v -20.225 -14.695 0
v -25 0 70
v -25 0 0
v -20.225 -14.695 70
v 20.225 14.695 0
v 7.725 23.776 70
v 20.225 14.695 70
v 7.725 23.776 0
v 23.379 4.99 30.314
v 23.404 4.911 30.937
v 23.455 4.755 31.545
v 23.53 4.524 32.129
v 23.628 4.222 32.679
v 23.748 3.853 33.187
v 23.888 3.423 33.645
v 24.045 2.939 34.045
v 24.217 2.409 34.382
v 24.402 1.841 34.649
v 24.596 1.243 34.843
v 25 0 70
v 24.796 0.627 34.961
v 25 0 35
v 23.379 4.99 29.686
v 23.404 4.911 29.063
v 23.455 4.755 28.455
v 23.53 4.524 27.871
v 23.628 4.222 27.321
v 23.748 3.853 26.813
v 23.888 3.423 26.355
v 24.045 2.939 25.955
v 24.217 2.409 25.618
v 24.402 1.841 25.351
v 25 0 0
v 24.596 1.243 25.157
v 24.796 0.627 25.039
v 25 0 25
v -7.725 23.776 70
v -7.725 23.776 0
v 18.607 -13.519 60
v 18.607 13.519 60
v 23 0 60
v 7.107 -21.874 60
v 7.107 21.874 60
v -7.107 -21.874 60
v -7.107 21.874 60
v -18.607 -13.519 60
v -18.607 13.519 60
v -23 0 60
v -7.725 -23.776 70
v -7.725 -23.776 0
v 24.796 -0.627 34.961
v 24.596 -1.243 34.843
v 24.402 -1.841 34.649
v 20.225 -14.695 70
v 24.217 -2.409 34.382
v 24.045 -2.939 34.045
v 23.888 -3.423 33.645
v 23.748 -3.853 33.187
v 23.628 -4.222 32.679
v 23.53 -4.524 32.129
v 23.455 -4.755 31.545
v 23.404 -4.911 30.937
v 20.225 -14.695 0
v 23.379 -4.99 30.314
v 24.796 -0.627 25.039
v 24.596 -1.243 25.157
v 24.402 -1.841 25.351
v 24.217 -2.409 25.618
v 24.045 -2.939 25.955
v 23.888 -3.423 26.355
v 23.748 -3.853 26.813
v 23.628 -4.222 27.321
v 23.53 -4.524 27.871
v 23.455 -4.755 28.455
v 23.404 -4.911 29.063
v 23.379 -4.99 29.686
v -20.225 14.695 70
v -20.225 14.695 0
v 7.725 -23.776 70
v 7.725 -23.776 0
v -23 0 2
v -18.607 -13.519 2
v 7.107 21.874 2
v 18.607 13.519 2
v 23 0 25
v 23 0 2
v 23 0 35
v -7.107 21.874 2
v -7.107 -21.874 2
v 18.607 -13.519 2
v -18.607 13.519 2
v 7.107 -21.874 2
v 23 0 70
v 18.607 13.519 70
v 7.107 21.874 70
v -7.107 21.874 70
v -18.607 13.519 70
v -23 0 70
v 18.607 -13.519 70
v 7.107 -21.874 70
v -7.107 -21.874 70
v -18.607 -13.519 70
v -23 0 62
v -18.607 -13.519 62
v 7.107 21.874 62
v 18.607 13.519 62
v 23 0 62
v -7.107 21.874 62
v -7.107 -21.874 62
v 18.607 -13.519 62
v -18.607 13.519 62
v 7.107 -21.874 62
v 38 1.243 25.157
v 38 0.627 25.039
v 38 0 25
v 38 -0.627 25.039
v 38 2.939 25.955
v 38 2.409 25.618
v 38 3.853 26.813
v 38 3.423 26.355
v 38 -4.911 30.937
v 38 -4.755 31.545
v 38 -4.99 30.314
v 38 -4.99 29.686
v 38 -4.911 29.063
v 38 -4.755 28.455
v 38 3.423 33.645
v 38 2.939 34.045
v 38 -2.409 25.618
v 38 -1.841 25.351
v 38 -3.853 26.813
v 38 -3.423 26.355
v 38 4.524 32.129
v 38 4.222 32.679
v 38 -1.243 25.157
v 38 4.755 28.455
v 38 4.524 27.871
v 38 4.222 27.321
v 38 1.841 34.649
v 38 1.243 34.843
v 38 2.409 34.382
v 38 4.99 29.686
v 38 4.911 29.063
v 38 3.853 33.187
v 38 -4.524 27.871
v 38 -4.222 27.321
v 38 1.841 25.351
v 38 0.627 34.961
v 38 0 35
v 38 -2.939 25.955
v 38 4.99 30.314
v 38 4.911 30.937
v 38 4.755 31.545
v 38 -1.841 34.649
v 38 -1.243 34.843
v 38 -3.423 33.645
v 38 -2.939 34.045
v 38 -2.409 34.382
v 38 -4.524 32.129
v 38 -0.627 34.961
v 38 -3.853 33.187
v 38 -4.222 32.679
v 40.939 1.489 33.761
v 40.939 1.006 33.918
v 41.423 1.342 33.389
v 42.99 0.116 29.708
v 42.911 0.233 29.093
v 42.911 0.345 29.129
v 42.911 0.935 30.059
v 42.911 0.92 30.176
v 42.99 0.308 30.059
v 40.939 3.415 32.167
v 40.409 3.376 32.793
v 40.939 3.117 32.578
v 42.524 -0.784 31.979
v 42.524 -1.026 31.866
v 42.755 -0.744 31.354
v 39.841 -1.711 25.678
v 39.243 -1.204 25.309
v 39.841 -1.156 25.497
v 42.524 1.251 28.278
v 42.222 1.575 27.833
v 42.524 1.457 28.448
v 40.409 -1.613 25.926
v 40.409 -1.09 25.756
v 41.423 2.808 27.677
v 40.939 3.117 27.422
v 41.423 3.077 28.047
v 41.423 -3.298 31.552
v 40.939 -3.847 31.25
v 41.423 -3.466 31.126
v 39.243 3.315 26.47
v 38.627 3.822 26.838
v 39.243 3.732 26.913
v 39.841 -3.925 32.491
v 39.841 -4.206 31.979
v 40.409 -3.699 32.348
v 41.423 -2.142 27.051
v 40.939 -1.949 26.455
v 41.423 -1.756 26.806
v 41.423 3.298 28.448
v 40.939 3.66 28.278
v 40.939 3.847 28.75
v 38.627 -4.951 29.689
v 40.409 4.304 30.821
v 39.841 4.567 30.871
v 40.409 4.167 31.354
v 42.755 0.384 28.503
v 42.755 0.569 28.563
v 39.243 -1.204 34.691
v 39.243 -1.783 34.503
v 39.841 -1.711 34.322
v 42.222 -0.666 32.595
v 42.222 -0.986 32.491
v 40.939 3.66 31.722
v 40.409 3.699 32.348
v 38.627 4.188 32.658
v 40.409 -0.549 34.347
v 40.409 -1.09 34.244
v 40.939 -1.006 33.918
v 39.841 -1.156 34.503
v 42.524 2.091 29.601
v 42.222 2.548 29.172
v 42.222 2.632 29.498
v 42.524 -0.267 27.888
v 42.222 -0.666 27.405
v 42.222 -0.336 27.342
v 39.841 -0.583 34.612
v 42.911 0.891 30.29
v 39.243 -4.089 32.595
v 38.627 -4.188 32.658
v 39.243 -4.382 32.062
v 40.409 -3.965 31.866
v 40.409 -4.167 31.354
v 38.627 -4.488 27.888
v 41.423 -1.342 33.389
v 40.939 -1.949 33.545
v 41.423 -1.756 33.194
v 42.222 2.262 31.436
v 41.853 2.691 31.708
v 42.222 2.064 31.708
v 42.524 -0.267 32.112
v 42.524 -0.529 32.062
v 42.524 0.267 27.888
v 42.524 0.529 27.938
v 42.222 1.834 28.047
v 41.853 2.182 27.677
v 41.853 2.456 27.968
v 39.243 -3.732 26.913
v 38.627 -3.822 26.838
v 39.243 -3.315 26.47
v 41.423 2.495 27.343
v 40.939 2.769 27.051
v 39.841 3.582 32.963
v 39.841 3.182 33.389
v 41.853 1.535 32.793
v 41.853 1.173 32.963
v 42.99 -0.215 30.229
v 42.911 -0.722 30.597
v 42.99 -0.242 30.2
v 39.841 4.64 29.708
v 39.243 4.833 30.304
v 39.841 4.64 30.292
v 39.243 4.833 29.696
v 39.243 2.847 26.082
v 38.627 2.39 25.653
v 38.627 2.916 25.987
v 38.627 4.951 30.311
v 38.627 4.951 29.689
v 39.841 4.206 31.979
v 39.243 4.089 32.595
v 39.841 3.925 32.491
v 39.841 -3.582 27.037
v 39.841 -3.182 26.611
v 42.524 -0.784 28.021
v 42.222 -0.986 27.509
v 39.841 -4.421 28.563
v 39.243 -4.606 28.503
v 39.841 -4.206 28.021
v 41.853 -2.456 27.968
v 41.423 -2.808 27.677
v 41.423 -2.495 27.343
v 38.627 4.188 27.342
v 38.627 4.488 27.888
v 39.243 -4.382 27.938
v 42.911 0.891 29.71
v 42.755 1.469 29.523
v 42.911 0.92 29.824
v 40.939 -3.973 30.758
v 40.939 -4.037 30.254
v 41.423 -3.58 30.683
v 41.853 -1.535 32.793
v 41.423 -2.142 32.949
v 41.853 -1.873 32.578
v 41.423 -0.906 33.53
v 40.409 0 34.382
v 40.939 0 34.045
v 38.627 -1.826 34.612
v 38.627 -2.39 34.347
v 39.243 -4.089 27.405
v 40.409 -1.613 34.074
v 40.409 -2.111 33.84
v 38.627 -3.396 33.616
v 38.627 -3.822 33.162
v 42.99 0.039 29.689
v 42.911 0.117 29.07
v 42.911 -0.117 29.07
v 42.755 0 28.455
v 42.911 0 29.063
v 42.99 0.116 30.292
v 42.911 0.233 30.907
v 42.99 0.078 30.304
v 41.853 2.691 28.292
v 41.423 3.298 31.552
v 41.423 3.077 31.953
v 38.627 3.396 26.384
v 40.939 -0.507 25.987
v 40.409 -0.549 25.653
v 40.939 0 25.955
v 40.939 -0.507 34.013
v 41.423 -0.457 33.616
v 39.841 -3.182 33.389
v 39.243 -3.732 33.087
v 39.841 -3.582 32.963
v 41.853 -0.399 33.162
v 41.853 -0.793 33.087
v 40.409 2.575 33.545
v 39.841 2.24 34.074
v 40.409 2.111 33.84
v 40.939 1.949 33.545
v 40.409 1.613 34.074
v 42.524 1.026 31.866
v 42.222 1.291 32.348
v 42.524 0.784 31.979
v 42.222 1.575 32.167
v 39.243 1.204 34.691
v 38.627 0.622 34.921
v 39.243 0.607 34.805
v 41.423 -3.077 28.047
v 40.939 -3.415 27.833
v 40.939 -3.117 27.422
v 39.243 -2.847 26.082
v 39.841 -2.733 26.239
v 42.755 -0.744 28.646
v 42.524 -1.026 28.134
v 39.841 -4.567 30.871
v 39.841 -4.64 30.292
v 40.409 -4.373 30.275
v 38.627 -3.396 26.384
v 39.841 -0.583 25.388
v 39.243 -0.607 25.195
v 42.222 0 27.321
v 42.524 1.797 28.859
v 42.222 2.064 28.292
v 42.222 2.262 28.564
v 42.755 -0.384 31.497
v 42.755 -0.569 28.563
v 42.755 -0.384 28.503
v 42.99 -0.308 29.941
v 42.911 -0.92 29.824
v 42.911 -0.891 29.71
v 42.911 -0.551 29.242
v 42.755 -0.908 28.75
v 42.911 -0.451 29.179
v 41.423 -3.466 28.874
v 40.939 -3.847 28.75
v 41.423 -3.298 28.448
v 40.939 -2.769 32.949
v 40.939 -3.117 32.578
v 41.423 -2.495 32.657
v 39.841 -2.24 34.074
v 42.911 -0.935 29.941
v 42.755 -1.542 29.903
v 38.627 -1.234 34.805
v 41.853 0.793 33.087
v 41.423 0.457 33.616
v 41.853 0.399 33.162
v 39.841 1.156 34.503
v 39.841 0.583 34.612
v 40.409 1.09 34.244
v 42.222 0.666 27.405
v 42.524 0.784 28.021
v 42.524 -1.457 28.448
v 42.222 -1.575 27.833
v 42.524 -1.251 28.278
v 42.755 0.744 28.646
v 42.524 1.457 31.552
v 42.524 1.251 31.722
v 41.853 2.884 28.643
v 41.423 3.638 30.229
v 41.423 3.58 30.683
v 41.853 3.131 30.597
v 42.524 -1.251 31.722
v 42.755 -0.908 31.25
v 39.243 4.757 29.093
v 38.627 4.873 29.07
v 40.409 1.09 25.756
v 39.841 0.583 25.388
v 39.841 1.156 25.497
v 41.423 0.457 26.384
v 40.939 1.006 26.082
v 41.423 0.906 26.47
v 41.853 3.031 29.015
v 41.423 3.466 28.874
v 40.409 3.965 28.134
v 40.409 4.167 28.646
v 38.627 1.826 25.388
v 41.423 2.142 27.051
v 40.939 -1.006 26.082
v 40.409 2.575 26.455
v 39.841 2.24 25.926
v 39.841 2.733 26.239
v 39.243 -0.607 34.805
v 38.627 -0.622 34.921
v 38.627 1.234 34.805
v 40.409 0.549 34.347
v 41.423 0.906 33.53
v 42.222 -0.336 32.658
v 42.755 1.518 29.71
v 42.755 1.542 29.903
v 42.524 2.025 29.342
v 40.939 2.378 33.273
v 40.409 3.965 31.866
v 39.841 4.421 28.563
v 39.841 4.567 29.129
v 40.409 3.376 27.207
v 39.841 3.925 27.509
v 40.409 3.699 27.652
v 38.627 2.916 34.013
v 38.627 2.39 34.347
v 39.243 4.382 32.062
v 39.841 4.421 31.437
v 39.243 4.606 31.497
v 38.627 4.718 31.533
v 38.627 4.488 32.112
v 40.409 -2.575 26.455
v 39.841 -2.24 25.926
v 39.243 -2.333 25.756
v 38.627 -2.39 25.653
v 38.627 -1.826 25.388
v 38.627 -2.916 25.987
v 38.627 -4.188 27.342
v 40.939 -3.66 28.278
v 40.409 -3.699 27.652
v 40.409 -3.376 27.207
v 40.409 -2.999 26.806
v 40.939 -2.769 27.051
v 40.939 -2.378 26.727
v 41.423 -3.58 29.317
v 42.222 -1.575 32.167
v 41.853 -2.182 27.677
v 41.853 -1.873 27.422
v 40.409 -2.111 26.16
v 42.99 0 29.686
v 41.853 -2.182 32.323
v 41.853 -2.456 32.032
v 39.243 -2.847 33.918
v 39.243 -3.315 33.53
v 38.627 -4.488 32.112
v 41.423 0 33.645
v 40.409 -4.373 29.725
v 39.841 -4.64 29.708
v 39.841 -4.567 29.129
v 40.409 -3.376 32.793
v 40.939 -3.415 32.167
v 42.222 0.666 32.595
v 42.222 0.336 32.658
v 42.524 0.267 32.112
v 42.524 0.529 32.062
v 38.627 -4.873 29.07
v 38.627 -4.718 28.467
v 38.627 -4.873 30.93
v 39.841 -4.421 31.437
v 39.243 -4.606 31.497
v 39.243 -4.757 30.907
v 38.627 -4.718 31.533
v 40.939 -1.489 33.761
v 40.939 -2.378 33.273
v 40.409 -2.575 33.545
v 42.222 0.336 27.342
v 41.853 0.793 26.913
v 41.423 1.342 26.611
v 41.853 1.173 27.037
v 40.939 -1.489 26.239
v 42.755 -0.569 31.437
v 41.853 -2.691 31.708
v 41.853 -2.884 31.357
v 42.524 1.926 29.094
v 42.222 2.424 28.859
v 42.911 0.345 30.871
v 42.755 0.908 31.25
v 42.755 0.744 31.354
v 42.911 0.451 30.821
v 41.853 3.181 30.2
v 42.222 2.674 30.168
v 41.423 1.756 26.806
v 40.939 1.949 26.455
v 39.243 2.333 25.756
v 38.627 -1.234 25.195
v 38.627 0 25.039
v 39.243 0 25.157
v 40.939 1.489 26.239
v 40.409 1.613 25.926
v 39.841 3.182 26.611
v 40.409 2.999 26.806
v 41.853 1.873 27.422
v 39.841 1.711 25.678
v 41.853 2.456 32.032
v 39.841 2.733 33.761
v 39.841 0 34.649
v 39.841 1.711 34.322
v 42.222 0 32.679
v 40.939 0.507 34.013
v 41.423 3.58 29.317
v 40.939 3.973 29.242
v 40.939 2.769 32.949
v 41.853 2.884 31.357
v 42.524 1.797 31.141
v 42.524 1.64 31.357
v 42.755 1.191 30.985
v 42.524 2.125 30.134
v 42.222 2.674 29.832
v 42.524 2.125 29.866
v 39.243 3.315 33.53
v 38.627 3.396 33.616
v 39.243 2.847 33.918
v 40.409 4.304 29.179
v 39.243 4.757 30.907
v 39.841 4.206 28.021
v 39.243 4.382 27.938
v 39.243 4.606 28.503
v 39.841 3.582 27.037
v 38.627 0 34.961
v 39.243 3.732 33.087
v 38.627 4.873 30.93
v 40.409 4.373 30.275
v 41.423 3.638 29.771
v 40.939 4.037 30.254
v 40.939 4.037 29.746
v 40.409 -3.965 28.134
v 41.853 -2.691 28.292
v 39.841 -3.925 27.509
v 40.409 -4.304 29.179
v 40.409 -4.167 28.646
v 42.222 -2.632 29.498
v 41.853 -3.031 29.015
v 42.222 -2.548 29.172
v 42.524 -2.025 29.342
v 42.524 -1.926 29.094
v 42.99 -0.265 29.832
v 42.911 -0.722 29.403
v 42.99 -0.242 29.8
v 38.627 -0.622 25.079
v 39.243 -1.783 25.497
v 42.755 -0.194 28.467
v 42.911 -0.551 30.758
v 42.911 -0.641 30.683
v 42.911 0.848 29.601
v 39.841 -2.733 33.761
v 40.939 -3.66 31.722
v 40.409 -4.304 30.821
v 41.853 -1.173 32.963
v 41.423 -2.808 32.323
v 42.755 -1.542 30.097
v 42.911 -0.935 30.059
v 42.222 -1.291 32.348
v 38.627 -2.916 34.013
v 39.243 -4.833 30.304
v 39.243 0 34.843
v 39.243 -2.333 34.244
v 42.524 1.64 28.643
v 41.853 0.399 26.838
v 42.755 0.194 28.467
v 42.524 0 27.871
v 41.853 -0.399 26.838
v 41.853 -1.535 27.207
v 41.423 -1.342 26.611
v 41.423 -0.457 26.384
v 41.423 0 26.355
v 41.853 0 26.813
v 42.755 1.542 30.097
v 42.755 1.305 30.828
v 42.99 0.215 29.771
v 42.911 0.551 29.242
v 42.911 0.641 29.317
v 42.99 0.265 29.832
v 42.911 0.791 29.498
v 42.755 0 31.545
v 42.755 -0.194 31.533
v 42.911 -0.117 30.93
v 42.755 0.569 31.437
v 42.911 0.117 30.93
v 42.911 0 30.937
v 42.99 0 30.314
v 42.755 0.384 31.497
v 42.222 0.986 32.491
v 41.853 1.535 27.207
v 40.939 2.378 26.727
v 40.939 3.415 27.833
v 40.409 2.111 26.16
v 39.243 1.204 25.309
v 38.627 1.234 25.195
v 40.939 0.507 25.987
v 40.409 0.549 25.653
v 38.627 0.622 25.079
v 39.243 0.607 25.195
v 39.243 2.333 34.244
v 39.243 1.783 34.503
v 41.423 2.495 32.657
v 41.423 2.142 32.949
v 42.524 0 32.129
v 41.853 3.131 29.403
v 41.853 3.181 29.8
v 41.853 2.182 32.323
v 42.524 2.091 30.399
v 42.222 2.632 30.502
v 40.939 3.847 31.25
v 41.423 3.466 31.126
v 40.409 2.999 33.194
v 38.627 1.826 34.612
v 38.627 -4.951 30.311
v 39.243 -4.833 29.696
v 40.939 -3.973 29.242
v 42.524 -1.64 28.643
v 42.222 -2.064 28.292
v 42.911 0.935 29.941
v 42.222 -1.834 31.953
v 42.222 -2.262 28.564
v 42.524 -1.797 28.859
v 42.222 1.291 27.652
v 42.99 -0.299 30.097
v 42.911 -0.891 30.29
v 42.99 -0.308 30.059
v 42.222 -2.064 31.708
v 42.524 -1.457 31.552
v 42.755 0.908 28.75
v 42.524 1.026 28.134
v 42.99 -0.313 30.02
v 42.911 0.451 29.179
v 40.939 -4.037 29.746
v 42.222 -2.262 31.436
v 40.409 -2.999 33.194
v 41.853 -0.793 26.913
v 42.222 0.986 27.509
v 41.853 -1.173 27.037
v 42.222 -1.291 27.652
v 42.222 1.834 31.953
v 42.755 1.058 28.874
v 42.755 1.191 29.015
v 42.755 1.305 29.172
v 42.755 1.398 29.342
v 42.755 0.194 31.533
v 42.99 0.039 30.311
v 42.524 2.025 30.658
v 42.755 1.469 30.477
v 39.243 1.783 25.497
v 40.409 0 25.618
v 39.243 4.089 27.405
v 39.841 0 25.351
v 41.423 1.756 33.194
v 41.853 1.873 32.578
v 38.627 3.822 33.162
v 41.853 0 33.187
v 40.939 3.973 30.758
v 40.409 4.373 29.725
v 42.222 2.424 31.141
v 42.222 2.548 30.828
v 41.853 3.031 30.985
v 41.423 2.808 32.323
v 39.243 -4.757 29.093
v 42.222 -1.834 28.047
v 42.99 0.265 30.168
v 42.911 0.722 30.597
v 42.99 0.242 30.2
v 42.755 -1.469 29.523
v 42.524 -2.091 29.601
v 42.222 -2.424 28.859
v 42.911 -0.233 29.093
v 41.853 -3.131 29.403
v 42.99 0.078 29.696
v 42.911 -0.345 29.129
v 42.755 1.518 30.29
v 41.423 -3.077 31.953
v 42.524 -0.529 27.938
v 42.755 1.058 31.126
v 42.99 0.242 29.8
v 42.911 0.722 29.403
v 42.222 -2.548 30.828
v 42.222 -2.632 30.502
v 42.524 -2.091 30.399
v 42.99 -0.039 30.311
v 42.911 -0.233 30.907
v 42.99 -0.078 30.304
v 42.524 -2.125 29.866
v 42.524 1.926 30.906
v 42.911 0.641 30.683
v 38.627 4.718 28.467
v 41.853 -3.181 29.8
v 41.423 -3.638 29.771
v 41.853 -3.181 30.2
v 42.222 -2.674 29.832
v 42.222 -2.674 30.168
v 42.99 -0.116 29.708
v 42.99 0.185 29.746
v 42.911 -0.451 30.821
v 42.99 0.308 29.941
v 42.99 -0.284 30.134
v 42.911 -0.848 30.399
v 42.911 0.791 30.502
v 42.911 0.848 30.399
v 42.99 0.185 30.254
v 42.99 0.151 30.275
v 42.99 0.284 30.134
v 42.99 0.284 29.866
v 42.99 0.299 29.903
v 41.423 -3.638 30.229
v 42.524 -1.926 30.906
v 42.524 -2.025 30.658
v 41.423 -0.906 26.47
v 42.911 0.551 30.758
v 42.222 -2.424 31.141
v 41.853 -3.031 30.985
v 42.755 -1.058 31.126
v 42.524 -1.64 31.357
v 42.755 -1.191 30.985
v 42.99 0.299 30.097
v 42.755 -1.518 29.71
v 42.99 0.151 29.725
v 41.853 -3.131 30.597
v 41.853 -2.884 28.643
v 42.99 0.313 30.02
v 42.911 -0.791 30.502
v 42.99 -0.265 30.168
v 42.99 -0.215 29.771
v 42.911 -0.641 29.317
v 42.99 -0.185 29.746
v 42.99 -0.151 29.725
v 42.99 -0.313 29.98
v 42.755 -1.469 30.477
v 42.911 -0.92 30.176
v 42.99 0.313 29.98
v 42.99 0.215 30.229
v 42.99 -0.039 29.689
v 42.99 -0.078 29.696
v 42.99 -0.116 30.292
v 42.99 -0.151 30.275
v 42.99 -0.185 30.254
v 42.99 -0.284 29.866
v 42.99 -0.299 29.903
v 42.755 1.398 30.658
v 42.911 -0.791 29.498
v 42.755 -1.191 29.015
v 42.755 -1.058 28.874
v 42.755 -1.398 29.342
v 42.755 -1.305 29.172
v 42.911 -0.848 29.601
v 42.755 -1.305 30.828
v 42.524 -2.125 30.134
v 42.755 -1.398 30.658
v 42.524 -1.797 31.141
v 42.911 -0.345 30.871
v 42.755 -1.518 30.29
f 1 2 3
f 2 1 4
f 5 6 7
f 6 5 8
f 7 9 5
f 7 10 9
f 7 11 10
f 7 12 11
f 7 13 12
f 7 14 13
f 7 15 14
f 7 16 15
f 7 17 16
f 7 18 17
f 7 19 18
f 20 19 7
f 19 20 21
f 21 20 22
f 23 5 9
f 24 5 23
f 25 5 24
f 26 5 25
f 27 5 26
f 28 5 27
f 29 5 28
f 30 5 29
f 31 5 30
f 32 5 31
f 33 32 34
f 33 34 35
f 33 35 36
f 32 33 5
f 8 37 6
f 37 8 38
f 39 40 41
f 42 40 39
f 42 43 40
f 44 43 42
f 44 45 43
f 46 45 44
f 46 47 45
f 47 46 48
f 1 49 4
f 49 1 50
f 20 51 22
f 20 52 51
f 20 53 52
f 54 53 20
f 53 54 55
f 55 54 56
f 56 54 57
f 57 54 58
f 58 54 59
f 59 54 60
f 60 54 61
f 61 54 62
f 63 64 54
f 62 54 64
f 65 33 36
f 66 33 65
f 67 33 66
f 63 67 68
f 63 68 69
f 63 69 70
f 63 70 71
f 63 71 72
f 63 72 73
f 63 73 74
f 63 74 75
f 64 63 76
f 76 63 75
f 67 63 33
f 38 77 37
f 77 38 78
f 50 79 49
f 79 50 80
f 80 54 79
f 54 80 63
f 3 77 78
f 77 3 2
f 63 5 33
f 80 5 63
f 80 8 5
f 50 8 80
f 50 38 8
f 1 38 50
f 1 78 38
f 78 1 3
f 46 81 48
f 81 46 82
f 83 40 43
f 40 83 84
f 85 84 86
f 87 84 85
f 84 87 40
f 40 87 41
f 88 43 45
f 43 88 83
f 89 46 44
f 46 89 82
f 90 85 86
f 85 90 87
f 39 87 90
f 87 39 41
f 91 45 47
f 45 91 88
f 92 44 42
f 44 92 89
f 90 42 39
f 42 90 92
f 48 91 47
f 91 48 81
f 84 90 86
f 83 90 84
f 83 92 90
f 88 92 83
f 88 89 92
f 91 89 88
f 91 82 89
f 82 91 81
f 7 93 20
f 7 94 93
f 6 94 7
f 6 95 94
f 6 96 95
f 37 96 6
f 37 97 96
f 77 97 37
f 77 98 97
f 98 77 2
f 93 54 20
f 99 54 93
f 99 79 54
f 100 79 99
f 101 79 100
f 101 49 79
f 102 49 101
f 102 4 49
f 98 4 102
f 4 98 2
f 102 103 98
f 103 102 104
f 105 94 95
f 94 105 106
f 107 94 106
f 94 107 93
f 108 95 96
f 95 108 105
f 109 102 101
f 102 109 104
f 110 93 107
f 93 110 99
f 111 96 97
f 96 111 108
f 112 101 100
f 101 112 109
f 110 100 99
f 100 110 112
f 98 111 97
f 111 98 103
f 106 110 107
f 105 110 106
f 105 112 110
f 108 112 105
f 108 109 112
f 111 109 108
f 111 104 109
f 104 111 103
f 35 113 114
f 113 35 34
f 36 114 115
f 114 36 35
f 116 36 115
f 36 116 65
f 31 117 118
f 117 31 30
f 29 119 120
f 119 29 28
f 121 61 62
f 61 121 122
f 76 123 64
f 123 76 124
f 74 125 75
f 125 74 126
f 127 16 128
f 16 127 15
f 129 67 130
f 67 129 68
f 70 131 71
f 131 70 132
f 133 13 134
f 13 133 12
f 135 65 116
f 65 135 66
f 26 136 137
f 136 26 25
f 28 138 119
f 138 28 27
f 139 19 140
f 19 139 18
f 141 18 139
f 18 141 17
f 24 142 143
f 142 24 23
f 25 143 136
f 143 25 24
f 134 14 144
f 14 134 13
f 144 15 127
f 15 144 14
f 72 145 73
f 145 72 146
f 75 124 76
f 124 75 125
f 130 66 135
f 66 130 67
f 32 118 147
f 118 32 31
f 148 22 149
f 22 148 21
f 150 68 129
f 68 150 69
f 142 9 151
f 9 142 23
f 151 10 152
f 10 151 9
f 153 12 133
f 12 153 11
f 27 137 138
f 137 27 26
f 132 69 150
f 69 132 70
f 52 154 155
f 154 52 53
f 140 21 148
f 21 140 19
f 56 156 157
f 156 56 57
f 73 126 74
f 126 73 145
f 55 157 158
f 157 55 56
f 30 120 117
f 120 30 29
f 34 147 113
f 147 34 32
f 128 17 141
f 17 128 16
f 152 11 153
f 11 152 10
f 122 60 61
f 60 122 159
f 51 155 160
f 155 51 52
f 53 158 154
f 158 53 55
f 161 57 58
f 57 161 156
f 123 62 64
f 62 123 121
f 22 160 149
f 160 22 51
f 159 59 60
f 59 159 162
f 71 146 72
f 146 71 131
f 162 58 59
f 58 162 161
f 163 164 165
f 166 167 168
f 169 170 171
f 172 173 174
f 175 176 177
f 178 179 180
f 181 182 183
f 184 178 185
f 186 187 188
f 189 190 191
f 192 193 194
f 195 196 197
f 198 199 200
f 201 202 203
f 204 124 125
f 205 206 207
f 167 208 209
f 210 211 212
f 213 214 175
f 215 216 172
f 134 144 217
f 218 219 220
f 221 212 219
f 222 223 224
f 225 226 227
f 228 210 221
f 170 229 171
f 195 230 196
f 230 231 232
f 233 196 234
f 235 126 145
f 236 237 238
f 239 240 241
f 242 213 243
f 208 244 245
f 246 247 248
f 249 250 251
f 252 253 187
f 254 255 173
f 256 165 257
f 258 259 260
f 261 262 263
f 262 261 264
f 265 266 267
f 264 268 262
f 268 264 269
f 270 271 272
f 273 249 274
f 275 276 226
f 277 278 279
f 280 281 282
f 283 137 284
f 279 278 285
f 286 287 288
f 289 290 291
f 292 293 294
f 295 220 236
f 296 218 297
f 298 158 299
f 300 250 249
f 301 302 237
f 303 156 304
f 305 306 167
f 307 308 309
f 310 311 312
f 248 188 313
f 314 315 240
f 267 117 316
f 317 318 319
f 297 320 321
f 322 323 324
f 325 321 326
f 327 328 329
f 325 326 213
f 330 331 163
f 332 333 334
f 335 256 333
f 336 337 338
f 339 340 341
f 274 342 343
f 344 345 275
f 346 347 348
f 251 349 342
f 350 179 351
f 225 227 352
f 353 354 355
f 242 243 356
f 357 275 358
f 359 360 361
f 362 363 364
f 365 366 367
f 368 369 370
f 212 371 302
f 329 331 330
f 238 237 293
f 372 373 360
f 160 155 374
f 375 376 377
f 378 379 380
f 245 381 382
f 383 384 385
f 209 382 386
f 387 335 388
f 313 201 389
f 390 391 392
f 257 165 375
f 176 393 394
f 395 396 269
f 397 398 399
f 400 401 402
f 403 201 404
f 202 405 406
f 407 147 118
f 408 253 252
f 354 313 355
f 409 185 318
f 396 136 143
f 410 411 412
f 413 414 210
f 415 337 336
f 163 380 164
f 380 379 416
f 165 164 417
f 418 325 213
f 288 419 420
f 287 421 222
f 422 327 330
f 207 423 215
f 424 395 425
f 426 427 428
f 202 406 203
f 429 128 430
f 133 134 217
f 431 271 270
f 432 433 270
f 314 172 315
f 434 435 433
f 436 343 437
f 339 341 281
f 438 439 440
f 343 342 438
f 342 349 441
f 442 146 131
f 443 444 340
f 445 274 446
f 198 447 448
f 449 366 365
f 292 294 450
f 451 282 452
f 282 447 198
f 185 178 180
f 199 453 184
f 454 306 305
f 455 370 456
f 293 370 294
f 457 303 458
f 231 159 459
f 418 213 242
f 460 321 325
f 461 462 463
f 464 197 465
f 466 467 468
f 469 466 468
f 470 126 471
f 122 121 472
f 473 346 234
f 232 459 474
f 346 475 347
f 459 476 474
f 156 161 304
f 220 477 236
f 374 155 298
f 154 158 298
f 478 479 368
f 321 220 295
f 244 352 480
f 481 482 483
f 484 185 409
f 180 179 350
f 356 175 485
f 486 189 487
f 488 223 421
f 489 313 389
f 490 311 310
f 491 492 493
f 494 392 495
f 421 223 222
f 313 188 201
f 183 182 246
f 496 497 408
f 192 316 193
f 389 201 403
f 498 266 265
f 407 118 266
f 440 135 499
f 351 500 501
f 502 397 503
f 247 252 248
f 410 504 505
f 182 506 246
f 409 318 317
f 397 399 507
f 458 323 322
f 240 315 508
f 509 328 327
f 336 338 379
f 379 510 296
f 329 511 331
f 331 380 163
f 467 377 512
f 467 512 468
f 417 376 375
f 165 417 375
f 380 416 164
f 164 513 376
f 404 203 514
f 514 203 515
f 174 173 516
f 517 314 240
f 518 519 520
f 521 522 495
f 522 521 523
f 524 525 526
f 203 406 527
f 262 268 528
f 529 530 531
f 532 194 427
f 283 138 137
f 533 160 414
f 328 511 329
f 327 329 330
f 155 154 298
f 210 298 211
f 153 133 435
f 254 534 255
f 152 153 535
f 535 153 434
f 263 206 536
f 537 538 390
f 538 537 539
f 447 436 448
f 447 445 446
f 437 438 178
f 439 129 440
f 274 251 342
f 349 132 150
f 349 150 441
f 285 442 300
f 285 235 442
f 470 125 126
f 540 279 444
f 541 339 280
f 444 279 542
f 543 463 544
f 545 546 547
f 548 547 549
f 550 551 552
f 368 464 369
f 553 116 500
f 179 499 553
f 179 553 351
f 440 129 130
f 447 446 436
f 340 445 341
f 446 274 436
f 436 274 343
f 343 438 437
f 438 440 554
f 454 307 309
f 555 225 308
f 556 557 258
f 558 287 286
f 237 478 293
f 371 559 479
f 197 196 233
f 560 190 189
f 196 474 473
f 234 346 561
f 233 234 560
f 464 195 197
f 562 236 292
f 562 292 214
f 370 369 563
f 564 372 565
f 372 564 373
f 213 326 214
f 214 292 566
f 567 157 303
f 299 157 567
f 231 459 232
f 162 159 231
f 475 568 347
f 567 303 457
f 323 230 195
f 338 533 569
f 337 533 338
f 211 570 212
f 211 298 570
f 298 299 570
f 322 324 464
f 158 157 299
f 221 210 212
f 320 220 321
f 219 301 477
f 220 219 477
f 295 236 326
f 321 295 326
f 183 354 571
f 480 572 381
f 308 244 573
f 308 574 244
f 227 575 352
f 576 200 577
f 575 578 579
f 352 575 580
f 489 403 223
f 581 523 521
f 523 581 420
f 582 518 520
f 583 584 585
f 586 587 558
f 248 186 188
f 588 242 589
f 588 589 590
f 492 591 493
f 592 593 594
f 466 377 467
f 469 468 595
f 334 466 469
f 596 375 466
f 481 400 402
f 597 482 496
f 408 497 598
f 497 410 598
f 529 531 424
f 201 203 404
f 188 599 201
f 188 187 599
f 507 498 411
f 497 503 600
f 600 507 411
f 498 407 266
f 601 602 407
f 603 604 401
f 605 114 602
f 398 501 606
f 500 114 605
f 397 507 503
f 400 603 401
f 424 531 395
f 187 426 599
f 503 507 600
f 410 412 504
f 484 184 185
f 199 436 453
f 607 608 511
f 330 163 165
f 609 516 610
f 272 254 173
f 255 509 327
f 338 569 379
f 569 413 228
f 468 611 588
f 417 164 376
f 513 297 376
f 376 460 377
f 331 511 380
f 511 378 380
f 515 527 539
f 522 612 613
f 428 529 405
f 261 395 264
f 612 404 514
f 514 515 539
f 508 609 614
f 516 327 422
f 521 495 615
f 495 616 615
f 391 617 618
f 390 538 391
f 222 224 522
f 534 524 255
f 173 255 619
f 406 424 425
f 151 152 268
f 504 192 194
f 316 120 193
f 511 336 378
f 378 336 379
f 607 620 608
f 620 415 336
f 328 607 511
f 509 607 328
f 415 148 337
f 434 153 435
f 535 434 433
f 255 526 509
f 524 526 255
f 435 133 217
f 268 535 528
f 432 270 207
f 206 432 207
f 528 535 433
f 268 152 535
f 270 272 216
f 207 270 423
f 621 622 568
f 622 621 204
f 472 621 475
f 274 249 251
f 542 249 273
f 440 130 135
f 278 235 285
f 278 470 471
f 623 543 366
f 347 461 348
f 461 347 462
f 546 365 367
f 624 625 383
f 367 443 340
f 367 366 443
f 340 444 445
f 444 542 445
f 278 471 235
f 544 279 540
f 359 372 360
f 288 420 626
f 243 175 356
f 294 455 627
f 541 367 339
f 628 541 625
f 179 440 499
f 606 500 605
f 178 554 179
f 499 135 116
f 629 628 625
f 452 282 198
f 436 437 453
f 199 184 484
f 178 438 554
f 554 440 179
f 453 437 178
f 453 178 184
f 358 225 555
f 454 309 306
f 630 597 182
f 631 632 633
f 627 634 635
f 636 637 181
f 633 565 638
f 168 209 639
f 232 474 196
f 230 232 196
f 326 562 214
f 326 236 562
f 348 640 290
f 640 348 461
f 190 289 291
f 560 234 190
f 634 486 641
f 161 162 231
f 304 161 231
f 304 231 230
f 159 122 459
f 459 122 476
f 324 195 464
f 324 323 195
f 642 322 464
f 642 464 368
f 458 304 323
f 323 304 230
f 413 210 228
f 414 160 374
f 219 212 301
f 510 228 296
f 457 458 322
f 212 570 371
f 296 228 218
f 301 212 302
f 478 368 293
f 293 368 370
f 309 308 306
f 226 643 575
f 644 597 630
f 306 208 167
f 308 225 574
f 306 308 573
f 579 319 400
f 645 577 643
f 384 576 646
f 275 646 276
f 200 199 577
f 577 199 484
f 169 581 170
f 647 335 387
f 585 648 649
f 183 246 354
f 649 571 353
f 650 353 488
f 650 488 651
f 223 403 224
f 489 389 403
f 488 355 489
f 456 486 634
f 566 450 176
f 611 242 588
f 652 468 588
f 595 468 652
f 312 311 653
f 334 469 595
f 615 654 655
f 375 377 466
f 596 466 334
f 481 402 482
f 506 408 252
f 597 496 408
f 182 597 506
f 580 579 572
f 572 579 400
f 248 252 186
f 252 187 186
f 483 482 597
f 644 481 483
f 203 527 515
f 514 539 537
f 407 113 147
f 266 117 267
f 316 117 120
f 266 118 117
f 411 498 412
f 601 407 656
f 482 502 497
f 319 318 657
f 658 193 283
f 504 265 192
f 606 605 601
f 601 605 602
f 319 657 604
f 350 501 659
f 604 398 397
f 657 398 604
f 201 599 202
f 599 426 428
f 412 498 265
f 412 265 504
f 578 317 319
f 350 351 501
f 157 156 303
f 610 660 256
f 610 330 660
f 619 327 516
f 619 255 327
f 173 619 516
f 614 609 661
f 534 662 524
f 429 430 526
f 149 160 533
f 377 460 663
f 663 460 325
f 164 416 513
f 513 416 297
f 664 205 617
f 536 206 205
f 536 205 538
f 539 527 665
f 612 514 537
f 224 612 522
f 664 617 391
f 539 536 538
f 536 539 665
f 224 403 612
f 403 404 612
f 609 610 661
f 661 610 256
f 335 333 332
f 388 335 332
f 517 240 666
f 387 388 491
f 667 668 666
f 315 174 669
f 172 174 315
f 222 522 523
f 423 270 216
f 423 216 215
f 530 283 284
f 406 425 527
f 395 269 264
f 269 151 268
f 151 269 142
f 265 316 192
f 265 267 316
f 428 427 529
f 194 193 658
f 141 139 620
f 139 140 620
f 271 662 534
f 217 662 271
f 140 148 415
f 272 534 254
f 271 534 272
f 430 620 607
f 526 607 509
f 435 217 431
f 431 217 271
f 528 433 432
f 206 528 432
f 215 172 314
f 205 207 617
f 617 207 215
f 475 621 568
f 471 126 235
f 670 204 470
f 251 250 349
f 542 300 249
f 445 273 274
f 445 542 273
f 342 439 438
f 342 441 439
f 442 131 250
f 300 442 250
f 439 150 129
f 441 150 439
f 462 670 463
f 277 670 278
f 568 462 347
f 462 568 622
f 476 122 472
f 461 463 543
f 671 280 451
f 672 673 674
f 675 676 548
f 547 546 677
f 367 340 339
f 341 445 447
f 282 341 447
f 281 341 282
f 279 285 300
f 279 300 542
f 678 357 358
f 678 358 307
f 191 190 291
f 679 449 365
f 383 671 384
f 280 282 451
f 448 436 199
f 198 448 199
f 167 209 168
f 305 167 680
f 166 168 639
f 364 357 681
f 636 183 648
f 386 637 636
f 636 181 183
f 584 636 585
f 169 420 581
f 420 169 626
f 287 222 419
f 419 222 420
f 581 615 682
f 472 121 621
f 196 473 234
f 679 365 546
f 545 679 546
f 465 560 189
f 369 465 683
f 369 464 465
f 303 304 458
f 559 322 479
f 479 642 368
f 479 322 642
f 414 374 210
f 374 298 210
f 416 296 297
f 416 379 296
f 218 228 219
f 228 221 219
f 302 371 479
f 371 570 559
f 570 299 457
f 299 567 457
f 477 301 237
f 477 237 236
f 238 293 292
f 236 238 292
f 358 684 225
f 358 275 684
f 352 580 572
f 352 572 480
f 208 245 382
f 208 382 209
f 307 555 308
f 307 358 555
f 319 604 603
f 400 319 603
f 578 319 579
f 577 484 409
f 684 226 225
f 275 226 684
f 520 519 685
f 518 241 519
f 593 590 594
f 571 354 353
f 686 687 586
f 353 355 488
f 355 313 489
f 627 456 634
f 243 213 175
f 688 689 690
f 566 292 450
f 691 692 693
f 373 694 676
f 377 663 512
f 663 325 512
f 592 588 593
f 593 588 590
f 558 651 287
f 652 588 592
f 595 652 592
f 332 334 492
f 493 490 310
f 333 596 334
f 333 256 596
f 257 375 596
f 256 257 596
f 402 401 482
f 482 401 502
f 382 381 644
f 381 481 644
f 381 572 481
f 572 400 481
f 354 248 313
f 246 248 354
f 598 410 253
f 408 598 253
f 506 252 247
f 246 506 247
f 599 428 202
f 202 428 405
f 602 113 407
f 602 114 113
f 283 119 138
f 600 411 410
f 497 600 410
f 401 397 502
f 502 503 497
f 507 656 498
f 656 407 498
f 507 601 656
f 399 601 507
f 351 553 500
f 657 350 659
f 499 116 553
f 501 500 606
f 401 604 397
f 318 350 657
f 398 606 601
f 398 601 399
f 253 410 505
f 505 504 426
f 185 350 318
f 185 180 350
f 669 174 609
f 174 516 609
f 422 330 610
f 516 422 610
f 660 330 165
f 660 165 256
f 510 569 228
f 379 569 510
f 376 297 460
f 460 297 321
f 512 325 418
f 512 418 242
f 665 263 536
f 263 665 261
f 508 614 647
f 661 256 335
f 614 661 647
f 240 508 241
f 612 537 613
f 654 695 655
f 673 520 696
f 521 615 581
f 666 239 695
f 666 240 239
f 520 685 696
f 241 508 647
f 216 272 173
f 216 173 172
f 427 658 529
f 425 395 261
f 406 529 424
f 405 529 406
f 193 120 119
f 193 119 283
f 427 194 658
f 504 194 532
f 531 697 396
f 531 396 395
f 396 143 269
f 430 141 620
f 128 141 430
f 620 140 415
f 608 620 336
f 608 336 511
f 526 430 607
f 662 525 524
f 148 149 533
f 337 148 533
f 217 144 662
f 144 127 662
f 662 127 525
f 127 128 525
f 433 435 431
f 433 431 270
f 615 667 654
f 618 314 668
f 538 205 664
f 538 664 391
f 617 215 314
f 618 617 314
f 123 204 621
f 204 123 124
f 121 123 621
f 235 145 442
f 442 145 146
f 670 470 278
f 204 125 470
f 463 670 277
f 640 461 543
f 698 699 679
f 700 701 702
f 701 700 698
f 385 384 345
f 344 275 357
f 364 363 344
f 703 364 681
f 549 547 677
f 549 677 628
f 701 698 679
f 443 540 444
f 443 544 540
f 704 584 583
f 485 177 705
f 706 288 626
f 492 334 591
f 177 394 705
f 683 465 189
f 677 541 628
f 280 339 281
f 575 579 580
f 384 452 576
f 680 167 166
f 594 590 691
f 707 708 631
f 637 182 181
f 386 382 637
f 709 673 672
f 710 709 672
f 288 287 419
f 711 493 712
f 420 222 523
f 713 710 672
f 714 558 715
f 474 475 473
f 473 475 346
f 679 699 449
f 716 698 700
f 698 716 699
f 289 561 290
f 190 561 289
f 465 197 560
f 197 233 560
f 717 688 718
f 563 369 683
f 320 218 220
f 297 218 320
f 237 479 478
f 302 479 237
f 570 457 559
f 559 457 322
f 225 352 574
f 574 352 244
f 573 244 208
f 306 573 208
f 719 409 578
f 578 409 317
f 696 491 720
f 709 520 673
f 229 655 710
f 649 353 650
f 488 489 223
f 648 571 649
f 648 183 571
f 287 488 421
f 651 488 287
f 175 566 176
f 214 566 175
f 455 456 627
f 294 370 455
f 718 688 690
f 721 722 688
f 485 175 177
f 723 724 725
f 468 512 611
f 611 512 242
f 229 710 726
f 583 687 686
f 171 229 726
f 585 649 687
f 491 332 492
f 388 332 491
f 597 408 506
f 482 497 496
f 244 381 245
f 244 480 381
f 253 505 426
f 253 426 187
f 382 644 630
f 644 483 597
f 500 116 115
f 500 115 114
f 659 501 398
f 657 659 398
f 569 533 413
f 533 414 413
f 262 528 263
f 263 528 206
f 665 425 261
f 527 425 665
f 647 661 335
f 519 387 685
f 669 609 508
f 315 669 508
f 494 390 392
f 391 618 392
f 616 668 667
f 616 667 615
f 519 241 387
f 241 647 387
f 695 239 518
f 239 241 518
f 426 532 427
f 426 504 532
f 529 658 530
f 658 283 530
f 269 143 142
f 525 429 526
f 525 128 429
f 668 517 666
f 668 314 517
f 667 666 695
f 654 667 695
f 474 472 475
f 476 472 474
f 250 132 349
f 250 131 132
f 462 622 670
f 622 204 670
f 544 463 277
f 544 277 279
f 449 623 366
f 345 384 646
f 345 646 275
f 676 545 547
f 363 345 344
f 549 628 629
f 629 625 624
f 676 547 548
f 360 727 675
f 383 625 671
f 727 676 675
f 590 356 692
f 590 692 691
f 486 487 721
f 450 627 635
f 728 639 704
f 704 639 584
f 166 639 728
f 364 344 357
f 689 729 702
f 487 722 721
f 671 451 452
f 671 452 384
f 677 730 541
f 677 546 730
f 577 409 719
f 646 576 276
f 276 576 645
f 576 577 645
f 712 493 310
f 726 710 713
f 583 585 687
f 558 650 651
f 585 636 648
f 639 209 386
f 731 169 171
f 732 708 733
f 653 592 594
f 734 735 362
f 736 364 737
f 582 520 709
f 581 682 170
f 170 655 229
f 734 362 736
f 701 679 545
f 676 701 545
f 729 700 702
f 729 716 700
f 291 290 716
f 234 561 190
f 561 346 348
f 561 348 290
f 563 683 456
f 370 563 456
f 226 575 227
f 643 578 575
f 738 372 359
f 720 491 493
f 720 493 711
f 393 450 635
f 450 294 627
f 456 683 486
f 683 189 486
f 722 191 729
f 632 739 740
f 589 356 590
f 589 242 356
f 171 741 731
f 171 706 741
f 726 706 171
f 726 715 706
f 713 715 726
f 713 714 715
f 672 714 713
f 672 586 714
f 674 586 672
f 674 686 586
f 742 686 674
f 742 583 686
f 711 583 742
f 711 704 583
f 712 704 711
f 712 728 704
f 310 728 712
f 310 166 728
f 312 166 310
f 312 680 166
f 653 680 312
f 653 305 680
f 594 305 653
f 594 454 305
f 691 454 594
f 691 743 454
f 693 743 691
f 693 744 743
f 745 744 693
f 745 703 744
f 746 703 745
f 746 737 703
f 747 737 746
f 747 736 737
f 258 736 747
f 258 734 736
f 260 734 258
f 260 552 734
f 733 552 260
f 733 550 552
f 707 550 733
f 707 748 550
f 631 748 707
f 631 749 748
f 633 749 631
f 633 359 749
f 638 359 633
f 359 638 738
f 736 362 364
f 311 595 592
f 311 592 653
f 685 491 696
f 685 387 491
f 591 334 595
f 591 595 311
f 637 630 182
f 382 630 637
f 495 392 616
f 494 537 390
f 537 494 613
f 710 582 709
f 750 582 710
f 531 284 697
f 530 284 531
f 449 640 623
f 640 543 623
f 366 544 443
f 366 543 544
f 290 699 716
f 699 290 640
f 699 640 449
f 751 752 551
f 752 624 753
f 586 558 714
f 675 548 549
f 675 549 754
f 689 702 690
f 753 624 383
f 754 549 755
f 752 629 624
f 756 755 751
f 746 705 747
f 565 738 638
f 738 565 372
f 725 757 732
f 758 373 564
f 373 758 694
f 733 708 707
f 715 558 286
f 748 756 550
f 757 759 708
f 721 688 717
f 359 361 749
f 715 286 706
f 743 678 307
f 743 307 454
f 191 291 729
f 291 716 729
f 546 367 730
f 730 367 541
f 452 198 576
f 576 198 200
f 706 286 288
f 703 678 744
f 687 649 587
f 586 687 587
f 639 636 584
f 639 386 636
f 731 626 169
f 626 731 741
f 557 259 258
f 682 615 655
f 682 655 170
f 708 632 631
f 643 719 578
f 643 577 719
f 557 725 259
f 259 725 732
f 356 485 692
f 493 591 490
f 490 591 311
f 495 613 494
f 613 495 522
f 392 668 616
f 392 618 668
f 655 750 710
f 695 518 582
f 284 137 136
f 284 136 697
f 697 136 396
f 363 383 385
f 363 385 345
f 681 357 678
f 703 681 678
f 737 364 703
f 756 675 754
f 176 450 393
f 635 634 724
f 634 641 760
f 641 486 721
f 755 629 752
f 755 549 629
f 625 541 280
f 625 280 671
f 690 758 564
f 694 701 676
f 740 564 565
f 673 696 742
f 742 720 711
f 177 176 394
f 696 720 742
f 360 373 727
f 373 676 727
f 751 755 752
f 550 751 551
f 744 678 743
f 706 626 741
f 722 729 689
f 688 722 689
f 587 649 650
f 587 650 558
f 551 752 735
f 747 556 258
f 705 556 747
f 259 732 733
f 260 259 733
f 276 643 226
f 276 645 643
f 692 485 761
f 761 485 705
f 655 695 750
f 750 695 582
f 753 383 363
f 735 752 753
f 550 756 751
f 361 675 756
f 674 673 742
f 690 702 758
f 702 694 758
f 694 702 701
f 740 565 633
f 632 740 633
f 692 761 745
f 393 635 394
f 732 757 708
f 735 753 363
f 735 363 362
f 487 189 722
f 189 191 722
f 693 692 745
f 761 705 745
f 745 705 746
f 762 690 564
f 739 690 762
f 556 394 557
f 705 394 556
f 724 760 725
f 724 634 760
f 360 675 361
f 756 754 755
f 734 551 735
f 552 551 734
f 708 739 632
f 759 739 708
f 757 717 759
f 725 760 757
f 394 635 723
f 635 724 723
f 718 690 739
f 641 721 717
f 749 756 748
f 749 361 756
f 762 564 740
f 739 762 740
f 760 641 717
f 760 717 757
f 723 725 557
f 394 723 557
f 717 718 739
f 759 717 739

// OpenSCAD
body_radius = 25;
body_height = 60;
lid_radius = 25;
lid_height = 10;
wall_thickness = 2;
handle_radius = 5;
handle_length = 15;

union() {
    difference() {
        cylinder(r = body_radius, h = body_height, $fn = 10);
        translate([0, 0, wall_thickness])
            cylinder(r = body_radius - wall_thickness, h = body_height, $fn = 10);
    }

    translate([0, 0, body_height])
    difference() {
        cylinder(r = lid_radius, h = lid_height, $fn = 10);
        translate([0, 0, wall_thickness])
            cylinder(r = lid_radius - wall_thickness, h = lid_height, $fn = 10);
    }

    translate([body_radius - 2, 0, body_height / 2])
    rotate([0, 90, 0])
    union() {
        cylinder(r = handle_radius, h = handle_length, $fn = 50);
        translate([0, 0, handle_length])
            sphere(r = handle_radius, $fn = 50);
    }
}
